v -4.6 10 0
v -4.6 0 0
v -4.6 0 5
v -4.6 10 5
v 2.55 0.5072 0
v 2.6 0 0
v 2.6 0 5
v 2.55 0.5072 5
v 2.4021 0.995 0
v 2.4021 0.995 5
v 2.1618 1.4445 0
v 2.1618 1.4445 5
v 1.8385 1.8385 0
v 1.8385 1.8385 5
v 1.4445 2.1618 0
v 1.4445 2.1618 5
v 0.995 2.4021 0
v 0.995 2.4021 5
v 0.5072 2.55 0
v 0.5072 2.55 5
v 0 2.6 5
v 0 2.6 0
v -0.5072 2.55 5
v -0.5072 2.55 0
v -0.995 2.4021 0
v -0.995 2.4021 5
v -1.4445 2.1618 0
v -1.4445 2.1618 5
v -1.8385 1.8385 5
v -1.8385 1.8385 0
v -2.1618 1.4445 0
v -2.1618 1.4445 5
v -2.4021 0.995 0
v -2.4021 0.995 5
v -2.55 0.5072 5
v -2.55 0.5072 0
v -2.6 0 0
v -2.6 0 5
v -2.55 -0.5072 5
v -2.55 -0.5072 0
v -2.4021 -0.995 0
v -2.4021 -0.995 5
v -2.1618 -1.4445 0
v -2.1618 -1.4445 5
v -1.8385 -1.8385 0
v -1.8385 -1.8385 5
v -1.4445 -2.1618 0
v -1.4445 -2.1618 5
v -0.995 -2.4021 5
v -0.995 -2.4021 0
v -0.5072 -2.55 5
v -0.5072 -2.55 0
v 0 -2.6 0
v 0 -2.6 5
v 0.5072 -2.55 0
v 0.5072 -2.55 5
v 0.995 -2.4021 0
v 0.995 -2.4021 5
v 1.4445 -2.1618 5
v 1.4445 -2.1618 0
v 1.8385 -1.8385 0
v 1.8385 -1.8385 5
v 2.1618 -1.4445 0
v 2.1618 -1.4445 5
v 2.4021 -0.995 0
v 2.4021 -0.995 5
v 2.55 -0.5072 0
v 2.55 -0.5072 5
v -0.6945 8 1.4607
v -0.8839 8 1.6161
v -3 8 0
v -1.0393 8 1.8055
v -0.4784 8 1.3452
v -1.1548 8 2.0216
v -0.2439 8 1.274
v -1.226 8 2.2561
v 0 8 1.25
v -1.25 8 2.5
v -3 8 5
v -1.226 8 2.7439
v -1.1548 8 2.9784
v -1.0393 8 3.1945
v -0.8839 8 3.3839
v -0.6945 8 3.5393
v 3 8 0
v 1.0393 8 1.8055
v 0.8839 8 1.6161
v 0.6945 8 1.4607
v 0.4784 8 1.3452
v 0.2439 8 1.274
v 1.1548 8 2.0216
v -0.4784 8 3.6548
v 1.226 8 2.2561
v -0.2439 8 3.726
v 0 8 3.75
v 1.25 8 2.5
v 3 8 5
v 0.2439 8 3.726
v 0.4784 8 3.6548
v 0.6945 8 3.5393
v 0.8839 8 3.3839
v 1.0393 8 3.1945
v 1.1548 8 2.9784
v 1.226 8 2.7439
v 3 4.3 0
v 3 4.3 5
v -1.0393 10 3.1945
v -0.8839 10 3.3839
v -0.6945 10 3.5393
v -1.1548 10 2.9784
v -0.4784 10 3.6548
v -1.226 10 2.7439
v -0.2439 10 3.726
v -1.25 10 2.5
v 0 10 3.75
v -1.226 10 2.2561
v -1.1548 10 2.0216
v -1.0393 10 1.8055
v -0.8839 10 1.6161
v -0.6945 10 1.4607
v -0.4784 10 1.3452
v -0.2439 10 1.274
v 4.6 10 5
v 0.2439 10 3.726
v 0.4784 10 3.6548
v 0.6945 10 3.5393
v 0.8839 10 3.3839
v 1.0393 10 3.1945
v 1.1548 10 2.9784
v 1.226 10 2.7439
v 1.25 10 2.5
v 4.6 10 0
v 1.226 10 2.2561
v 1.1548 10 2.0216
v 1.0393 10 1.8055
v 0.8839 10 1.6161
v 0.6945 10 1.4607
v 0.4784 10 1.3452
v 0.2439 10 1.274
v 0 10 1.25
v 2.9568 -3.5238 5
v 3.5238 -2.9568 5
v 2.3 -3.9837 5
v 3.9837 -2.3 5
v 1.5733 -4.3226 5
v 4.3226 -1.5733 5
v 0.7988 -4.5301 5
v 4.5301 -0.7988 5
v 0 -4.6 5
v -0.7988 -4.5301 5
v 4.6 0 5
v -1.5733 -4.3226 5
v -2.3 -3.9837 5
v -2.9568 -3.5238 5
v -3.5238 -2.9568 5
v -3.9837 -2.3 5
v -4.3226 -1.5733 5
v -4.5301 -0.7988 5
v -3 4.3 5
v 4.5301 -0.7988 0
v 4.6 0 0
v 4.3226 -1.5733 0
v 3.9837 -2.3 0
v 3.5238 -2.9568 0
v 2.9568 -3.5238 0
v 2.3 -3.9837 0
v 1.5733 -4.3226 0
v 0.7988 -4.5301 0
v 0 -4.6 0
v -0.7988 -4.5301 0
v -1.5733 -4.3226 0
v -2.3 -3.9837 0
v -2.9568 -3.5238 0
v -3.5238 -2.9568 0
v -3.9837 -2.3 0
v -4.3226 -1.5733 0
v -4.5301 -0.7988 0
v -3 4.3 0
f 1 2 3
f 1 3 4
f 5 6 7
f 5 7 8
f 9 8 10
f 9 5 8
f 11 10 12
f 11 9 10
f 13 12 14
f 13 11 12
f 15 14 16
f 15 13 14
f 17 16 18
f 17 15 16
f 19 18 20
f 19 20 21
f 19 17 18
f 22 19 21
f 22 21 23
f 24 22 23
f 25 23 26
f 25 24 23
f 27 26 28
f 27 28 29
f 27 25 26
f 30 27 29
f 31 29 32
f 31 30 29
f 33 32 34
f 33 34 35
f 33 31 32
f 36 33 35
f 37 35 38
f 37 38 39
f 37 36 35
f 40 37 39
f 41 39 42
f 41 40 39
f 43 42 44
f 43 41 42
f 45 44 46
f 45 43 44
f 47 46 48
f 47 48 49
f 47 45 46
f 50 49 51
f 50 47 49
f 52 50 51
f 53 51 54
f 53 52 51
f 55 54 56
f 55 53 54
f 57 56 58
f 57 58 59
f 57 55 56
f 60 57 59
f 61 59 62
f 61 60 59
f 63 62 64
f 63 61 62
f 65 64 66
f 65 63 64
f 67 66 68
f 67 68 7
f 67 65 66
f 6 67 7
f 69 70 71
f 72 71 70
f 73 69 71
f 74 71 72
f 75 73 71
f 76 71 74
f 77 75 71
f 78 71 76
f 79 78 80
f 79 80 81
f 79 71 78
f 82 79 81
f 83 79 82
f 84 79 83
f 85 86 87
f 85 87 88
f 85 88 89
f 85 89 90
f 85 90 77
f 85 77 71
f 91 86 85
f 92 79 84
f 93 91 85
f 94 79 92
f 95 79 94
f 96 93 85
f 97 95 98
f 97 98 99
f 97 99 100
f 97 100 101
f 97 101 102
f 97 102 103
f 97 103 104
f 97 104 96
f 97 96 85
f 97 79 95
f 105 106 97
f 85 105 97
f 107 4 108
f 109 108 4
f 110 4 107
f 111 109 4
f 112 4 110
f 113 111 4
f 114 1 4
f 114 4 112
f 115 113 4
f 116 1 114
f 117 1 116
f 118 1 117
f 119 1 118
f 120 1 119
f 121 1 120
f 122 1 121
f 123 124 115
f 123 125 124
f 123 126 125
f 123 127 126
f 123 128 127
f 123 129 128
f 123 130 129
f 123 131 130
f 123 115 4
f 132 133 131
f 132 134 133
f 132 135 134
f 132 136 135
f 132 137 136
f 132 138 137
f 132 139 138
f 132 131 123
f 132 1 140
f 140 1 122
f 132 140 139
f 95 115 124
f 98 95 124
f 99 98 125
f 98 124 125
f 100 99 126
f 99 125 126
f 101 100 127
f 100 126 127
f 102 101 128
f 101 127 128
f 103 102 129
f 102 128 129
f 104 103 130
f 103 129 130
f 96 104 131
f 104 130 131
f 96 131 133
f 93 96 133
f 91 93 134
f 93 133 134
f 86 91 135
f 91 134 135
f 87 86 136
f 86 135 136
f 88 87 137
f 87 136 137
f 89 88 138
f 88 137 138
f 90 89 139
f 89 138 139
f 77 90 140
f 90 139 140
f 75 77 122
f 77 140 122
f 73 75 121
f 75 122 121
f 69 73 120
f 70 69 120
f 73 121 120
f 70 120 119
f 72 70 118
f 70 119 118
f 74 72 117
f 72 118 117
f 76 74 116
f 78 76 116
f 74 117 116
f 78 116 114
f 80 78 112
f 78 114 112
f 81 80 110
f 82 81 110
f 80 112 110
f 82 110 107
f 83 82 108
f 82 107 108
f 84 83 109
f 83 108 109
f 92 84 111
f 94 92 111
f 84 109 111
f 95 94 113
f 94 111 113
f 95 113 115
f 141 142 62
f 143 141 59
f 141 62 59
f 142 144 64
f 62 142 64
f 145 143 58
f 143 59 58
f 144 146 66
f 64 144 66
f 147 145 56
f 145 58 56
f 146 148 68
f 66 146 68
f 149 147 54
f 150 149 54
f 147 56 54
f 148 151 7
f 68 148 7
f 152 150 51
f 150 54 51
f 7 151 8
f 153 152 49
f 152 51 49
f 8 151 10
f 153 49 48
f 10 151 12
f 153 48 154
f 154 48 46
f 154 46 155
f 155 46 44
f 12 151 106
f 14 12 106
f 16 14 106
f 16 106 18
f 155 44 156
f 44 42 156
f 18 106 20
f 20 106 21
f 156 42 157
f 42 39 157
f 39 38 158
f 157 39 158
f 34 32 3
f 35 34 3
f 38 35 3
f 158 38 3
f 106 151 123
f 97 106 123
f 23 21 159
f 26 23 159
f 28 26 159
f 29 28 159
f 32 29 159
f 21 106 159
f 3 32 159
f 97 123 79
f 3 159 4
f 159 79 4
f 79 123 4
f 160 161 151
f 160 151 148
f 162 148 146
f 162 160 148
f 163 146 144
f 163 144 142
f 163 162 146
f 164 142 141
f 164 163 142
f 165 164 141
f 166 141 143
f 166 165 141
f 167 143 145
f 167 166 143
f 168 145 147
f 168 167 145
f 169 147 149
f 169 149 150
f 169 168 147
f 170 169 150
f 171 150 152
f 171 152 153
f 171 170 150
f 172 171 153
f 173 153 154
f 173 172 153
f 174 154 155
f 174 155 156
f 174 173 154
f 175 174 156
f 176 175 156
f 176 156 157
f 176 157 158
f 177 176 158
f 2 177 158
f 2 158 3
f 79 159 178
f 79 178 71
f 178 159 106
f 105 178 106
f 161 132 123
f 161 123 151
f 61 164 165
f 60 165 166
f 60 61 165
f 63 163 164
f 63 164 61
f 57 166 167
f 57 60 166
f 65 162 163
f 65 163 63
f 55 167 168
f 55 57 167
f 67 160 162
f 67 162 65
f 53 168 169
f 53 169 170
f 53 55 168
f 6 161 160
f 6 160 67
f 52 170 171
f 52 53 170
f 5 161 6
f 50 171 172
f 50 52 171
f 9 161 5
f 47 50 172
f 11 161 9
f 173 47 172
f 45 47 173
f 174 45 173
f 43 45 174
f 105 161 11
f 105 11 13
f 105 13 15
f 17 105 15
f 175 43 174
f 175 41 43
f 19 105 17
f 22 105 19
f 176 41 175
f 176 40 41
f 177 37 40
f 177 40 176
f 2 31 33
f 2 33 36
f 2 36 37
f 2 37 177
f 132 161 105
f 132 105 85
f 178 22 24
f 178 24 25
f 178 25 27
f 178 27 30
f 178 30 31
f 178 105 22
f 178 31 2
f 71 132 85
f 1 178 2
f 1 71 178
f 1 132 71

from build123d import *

# Parameters (mm, degrees)
SKETCH1_R           = 2.6
BOSS_EXTRUDE1_DEPTH = 5
SKETCH2_R           = 1.25
CUT_EXTRUDE1_DEPTH  = 2
SKETCH3_W           = 6
SKETCH3_H           = 3.7
CUT_EXTRUDE2_DEPTH  = 5


with BuildPart() as part:
    # Sketch1 → Boss-Extrude1 (new body)
    with BuildSketch(Plane.XY):
        with BuildLine():
            Line((-4.6, 0), (-4.6, 10))
            Line((-4.6, 10), (4.6, 10))
            Line((4.6, 10), (4.6, 0))
            ThreePointArc((4.6, 0), (0, -4.6), (-4.6, 0))
        make_face()
        Circle(SKETCH1_R, mode=Mode.SUBTRACT)
    extrude(amount=BOSS_EXTRUDE1_DEPTH)

    # Sketch2 → Cut-Extrude1 (cut)
    with BuildSketch(Plane(origin=(0, 10, 0), x_dir=(1, 0, 0), z_dir=(0, 1, 0))):
        with Locations(Location((0, -2.5, 0), (0, 0, 270))):
            Circle(SKETCH2_R)
    extrude(amount=-CUT_EXTRUDE1_DEPTH, mode=Mode.SUBTRACT)

    # Sketch3 → Cut-Extrude2 (cut)
    with BuildSketch(Plane.XY.offset(5)):
        with Locations((0, 6.15)):
            Rectangle(SKETCH3_W, SKETCH3_H)
    extrude(amount=-CUT_EXTRUDE2_DEPTH, mode=Mode.SUBTRACT)


solid = part.part
